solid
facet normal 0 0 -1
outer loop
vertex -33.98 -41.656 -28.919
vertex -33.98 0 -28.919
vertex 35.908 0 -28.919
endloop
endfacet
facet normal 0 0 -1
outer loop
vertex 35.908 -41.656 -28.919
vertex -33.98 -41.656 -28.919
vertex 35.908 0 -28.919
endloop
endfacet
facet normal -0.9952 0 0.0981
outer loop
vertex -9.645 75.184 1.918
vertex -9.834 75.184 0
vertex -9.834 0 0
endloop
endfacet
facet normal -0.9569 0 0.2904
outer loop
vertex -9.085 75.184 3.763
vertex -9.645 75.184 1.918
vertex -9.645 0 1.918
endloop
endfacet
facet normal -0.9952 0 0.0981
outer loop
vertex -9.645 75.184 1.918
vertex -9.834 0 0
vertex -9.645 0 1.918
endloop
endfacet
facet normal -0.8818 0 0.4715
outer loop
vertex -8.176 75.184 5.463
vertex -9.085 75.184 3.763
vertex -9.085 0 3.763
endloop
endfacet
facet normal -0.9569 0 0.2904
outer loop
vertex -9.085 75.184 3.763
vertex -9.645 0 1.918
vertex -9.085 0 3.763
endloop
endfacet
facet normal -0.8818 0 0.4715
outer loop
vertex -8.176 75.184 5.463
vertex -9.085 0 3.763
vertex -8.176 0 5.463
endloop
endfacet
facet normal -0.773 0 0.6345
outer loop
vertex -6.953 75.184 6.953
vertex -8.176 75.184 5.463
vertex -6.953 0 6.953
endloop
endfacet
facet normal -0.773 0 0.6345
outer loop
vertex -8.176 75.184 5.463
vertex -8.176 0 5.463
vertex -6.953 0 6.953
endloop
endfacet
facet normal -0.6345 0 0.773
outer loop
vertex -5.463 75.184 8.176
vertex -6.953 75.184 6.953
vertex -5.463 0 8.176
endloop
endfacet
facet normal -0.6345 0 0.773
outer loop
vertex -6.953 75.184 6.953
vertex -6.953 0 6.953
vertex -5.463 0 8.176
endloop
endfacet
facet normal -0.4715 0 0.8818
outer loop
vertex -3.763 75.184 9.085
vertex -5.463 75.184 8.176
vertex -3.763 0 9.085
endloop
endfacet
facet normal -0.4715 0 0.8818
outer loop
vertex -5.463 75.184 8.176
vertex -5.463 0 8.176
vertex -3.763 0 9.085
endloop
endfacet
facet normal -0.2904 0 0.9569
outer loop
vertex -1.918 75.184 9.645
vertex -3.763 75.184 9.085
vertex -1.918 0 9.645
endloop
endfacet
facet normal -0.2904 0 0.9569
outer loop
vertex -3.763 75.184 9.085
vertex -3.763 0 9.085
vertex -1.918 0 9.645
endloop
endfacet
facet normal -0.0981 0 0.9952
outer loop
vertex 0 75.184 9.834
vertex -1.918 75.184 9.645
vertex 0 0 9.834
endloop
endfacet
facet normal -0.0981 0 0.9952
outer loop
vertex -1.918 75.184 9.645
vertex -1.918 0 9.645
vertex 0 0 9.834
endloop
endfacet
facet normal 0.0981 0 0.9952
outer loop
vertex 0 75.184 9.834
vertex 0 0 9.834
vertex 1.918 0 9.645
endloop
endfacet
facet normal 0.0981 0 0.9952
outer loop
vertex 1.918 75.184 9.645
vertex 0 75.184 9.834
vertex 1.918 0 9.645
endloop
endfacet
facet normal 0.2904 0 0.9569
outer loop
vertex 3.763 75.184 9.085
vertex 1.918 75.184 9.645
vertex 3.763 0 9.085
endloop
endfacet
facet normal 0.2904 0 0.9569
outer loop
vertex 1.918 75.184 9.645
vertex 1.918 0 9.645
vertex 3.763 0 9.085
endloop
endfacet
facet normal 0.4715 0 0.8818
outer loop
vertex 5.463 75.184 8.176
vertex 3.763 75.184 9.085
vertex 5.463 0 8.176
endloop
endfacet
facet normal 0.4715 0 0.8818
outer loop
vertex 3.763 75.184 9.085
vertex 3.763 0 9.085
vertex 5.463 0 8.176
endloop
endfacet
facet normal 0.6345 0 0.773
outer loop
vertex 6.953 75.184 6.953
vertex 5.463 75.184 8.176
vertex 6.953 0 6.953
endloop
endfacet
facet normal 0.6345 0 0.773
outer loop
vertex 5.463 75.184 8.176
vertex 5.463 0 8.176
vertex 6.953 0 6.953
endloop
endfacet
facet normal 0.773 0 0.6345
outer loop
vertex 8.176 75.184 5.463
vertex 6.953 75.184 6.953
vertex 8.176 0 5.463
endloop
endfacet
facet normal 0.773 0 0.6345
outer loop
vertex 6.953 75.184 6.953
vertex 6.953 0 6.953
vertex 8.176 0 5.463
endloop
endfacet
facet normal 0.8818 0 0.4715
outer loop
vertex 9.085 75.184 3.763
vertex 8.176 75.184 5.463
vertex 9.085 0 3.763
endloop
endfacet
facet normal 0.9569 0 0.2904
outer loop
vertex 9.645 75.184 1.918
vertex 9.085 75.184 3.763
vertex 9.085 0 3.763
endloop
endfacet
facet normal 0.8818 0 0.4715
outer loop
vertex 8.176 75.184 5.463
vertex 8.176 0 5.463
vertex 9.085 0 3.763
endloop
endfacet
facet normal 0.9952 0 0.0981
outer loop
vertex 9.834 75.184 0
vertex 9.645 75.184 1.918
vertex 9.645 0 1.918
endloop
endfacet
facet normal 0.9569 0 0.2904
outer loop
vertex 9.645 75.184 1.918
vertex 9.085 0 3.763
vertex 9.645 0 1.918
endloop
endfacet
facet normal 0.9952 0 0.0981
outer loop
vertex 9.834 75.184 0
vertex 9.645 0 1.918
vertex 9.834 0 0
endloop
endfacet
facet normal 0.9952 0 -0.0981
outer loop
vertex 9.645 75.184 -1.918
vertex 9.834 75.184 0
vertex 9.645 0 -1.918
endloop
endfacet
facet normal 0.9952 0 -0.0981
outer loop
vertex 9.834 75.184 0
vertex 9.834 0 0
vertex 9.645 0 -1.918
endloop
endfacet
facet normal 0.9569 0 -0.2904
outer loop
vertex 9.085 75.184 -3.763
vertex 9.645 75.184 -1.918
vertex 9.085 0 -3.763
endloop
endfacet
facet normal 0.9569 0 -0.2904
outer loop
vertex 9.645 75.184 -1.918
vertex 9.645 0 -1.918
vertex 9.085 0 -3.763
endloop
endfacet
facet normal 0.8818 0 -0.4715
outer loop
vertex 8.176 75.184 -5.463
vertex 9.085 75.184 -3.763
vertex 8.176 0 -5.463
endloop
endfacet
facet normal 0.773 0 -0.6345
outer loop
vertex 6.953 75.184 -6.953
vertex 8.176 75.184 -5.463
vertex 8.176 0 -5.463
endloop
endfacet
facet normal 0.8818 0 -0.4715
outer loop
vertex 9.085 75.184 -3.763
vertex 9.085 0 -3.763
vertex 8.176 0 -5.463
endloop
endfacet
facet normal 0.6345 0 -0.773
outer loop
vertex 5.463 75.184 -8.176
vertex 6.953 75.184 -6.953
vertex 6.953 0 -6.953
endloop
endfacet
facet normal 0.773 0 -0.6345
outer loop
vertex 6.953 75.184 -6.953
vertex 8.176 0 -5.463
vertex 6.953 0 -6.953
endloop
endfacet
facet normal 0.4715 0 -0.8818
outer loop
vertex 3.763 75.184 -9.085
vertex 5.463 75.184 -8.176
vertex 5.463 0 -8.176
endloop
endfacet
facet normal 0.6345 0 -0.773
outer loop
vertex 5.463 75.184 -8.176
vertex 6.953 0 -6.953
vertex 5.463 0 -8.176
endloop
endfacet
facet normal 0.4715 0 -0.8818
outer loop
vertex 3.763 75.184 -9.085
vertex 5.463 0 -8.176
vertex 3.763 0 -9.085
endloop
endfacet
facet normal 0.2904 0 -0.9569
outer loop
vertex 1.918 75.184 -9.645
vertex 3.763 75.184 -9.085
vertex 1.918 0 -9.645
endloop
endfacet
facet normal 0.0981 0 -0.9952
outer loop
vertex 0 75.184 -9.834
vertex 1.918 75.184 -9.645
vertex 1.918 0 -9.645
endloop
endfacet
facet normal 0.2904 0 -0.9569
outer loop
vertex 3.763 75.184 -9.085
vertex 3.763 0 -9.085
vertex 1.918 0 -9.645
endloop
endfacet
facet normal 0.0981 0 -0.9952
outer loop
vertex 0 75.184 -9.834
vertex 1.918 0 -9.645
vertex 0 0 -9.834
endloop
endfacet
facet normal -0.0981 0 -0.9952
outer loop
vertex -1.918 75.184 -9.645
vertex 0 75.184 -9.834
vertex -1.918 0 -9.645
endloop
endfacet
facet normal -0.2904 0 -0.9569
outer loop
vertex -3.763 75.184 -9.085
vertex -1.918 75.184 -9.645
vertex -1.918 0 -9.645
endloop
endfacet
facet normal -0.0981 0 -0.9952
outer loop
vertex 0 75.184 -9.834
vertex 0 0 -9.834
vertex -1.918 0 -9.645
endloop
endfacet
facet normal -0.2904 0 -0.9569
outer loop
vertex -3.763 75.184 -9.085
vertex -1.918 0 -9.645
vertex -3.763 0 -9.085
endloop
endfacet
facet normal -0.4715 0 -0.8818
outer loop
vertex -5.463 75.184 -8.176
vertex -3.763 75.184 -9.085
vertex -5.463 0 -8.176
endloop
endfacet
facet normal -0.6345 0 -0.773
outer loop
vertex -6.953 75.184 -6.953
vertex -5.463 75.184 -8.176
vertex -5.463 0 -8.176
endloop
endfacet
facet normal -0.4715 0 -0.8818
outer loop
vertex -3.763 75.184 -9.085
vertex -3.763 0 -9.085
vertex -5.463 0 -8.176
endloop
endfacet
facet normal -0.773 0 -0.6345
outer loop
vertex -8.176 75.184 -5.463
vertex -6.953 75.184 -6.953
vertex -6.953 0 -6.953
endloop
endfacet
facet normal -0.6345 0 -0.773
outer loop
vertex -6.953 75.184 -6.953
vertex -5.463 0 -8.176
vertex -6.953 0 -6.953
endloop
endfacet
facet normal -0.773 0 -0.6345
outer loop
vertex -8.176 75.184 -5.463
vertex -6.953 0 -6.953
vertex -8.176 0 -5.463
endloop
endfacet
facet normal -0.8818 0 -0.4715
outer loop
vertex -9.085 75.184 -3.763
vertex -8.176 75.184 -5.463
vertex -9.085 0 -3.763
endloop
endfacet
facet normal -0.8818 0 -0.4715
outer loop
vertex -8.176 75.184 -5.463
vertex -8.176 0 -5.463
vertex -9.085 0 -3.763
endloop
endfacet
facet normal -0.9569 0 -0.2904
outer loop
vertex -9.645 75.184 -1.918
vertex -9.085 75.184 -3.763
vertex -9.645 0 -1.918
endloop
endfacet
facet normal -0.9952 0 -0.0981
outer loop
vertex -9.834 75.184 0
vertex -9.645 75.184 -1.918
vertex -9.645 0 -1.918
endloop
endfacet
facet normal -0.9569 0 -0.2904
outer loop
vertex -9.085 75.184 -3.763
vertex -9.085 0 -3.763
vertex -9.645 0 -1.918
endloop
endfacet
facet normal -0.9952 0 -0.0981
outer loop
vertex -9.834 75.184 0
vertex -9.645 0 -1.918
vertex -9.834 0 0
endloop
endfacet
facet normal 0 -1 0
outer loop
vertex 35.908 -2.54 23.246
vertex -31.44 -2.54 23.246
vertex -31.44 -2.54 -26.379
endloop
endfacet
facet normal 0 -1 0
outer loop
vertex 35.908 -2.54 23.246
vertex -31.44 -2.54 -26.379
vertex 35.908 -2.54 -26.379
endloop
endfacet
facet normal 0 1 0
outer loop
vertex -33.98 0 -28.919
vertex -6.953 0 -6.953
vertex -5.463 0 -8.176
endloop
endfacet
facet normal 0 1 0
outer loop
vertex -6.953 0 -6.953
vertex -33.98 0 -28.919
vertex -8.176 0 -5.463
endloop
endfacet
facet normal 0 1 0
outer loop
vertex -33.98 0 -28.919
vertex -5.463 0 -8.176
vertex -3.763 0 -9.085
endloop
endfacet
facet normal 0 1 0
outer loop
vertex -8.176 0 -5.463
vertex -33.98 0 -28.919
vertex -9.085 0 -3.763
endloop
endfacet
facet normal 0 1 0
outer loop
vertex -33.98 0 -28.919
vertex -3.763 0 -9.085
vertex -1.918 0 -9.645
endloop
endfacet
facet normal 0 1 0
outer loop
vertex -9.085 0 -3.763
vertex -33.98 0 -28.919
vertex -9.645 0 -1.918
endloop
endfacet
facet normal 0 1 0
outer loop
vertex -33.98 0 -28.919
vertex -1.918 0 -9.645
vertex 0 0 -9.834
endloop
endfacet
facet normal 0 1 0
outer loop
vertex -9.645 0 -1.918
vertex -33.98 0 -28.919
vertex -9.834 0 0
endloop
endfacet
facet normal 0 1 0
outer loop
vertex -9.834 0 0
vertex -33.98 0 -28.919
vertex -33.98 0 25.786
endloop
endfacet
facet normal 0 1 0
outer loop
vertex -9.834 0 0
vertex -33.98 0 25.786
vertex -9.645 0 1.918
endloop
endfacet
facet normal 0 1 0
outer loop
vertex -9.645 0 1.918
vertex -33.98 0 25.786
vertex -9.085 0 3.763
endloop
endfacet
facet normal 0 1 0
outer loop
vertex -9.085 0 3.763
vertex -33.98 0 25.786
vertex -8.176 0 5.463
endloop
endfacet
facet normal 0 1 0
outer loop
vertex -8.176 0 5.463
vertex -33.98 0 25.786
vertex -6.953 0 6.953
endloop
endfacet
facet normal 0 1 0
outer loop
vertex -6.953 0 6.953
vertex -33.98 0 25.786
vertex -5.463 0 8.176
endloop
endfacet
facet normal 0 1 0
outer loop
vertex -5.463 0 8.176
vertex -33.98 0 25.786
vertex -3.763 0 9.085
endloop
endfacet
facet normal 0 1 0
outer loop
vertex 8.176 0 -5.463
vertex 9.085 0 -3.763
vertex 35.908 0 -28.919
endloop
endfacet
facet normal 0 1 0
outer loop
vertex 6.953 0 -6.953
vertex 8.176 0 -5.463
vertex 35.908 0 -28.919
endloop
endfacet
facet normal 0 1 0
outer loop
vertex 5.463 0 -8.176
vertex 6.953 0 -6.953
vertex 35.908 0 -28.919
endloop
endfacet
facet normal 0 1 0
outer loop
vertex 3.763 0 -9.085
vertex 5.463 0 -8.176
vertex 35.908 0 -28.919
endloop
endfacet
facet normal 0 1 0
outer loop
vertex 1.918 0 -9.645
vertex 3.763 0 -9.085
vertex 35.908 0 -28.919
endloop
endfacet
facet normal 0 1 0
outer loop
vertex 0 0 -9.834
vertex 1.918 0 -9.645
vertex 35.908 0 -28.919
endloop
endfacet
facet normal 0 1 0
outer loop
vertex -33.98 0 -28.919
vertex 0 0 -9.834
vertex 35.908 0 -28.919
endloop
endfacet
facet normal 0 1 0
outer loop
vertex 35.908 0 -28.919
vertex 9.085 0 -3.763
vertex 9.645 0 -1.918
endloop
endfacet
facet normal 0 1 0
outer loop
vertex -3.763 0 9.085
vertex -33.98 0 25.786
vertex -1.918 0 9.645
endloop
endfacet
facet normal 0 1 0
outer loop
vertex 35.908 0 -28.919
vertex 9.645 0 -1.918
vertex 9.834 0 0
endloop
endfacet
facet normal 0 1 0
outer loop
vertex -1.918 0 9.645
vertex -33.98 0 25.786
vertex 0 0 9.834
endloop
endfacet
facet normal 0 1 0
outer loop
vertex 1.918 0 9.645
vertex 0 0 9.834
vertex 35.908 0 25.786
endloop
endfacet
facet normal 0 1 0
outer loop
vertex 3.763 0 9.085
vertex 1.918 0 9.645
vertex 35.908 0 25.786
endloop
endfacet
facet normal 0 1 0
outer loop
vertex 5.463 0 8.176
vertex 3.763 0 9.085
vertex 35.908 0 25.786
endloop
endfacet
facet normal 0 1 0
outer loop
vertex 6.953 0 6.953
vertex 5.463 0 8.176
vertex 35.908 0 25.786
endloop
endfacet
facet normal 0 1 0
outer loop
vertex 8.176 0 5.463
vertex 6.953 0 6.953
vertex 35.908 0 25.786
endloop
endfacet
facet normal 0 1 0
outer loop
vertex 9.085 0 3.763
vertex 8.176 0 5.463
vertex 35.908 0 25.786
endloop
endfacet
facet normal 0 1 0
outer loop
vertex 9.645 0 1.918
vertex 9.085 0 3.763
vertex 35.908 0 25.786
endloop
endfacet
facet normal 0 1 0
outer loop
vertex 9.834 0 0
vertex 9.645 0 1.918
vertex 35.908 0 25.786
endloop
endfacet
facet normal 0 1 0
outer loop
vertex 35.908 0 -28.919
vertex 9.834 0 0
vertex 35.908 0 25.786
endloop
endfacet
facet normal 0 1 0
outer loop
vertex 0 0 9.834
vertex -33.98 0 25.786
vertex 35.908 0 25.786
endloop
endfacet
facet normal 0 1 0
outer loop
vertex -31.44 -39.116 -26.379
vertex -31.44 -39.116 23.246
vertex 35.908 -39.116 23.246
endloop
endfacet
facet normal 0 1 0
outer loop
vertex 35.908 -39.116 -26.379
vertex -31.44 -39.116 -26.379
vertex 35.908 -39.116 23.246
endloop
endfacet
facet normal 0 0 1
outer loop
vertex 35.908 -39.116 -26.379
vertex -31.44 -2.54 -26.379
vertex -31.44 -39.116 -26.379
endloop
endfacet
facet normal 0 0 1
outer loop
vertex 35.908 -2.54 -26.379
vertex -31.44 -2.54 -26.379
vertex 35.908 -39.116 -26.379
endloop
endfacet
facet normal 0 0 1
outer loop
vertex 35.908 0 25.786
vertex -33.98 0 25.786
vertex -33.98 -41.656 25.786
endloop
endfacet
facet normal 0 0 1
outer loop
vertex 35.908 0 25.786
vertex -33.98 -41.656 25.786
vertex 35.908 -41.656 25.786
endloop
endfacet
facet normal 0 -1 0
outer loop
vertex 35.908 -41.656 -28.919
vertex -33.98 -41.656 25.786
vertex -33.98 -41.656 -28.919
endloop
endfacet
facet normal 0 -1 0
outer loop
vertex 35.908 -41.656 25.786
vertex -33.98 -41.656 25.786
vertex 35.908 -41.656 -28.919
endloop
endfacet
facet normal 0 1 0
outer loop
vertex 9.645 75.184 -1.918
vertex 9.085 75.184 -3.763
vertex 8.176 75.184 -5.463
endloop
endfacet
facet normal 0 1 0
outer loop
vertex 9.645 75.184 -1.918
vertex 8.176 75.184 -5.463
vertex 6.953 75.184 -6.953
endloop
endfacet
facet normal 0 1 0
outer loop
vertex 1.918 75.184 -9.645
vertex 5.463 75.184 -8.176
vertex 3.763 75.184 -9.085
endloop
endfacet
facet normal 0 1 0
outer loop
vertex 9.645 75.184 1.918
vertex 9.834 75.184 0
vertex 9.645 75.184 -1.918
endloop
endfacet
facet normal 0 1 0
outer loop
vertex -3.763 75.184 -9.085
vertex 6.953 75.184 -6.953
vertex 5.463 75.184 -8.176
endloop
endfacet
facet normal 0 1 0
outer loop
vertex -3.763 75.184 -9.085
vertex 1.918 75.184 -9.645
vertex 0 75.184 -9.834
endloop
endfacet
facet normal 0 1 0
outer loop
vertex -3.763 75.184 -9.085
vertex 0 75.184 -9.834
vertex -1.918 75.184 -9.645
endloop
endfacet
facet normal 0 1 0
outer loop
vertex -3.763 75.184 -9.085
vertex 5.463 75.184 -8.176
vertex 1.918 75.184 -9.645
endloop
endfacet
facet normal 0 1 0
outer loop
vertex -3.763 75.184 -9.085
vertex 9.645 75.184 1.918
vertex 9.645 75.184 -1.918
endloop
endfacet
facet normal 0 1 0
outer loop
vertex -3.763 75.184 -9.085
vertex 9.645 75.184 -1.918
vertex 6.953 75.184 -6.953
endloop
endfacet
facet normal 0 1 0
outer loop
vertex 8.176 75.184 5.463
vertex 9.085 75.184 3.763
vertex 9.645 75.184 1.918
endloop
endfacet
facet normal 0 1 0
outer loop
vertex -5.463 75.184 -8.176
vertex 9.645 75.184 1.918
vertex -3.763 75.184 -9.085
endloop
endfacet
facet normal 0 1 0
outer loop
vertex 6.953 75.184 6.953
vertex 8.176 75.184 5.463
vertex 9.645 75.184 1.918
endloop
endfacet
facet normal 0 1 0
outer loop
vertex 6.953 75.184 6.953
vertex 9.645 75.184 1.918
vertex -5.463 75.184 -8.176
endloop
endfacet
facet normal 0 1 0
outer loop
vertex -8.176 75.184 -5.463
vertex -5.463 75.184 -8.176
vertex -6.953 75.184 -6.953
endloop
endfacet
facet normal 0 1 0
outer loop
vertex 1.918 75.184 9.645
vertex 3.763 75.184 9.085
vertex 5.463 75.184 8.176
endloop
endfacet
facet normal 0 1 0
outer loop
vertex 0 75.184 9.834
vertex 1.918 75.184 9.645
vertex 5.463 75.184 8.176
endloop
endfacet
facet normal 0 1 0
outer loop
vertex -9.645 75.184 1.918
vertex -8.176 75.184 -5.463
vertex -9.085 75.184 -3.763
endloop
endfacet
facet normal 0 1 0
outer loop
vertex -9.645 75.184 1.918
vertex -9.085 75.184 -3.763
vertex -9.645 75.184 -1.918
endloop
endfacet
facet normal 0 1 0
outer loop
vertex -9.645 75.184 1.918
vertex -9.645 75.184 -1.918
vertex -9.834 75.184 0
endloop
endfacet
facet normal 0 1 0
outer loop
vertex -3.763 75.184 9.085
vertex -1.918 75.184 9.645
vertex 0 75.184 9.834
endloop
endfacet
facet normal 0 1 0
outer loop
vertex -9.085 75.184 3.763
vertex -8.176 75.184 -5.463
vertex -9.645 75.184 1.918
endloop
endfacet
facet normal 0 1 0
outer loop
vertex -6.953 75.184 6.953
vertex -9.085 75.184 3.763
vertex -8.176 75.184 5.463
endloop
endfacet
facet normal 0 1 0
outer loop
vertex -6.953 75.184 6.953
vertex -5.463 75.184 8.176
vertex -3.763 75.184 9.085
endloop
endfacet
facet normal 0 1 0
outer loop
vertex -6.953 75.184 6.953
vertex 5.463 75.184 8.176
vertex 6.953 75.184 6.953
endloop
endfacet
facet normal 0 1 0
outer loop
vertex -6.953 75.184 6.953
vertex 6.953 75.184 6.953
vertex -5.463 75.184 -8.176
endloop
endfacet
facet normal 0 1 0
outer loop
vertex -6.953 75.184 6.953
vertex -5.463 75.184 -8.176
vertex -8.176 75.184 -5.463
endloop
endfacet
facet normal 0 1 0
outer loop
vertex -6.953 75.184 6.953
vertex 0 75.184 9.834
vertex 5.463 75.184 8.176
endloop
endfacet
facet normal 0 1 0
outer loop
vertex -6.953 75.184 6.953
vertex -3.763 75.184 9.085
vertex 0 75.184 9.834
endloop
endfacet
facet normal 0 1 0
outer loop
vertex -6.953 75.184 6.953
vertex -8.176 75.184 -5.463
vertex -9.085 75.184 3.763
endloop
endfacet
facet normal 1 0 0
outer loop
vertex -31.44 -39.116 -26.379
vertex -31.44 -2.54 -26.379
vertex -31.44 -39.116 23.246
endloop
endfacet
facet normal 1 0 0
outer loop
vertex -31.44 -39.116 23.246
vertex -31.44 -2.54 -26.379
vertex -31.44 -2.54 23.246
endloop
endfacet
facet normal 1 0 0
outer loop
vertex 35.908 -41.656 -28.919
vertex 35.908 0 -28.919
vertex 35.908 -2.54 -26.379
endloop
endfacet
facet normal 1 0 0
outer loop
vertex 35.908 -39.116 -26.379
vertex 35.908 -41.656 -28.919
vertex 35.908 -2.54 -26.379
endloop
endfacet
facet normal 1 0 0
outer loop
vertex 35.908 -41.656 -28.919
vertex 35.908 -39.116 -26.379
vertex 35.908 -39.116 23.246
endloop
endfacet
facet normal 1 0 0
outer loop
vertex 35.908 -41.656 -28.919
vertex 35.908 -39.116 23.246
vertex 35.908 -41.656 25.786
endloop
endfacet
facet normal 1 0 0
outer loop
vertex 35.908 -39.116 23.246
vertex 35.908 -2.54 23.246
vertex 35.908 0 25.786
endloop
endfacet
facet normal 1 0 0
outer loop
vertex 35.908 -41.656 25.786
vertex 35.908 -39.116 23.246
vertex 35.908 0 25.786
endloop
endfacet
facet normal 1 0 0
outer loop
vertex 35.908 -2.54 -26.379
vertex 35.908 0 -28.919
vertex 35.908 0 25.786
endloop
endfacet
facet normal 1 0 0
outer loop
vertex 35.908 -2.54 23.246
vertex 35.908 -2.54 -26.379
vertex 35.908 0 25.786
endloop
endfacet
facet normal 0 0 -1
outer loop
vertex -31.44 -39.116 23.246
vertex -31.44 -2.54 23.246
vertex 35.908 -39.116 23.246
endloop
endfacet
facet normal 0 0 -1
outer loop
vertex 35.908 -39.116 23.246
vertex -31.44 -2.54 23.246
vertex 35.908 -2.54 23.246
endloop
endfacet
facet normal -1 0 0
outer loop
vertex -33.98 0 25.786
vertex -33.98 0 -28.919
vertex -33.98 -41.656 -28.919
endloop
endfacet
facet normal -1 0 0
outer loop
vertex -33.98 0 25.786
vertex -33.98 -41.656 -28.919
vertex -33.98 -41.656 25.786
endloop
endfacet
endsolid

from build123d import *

# Parameters (mm, degrees)
F0_W     = 69.888253
F0_H     = 54.705635
F1_DEPTH = 41.656
F2_T     = -2.54
F3_R     = 9.833618
F4_DEPTH = 75.184


with BuildPart() as f1:
    # F0 (on Front) → F1 (new body)
    with BuildSketch(Plane.XZ):
        with Locations((0.963976, -1.56646)):
            Rectangle(F0_W, F0_H)
    extrude(amount=F1_DEPTH)

    # F2
    f2_openings = [f1.faces().sort_by_distance(p)[0] for p in [
        (35.908103, -20.828, -1.56646),
    ]]
    offset(amount=F2_T, openings=f2_openings)

    # F3 (on face) → F4 (join)
    with BuildSketch(Plane(origin=(0, 0, 0), x_dir=(-1, 0, 0), z_dir=(0, 1, 0))):
        Circle(F3_R)
    extrude(amount=F4_DEPTH)


solid = f1.part
